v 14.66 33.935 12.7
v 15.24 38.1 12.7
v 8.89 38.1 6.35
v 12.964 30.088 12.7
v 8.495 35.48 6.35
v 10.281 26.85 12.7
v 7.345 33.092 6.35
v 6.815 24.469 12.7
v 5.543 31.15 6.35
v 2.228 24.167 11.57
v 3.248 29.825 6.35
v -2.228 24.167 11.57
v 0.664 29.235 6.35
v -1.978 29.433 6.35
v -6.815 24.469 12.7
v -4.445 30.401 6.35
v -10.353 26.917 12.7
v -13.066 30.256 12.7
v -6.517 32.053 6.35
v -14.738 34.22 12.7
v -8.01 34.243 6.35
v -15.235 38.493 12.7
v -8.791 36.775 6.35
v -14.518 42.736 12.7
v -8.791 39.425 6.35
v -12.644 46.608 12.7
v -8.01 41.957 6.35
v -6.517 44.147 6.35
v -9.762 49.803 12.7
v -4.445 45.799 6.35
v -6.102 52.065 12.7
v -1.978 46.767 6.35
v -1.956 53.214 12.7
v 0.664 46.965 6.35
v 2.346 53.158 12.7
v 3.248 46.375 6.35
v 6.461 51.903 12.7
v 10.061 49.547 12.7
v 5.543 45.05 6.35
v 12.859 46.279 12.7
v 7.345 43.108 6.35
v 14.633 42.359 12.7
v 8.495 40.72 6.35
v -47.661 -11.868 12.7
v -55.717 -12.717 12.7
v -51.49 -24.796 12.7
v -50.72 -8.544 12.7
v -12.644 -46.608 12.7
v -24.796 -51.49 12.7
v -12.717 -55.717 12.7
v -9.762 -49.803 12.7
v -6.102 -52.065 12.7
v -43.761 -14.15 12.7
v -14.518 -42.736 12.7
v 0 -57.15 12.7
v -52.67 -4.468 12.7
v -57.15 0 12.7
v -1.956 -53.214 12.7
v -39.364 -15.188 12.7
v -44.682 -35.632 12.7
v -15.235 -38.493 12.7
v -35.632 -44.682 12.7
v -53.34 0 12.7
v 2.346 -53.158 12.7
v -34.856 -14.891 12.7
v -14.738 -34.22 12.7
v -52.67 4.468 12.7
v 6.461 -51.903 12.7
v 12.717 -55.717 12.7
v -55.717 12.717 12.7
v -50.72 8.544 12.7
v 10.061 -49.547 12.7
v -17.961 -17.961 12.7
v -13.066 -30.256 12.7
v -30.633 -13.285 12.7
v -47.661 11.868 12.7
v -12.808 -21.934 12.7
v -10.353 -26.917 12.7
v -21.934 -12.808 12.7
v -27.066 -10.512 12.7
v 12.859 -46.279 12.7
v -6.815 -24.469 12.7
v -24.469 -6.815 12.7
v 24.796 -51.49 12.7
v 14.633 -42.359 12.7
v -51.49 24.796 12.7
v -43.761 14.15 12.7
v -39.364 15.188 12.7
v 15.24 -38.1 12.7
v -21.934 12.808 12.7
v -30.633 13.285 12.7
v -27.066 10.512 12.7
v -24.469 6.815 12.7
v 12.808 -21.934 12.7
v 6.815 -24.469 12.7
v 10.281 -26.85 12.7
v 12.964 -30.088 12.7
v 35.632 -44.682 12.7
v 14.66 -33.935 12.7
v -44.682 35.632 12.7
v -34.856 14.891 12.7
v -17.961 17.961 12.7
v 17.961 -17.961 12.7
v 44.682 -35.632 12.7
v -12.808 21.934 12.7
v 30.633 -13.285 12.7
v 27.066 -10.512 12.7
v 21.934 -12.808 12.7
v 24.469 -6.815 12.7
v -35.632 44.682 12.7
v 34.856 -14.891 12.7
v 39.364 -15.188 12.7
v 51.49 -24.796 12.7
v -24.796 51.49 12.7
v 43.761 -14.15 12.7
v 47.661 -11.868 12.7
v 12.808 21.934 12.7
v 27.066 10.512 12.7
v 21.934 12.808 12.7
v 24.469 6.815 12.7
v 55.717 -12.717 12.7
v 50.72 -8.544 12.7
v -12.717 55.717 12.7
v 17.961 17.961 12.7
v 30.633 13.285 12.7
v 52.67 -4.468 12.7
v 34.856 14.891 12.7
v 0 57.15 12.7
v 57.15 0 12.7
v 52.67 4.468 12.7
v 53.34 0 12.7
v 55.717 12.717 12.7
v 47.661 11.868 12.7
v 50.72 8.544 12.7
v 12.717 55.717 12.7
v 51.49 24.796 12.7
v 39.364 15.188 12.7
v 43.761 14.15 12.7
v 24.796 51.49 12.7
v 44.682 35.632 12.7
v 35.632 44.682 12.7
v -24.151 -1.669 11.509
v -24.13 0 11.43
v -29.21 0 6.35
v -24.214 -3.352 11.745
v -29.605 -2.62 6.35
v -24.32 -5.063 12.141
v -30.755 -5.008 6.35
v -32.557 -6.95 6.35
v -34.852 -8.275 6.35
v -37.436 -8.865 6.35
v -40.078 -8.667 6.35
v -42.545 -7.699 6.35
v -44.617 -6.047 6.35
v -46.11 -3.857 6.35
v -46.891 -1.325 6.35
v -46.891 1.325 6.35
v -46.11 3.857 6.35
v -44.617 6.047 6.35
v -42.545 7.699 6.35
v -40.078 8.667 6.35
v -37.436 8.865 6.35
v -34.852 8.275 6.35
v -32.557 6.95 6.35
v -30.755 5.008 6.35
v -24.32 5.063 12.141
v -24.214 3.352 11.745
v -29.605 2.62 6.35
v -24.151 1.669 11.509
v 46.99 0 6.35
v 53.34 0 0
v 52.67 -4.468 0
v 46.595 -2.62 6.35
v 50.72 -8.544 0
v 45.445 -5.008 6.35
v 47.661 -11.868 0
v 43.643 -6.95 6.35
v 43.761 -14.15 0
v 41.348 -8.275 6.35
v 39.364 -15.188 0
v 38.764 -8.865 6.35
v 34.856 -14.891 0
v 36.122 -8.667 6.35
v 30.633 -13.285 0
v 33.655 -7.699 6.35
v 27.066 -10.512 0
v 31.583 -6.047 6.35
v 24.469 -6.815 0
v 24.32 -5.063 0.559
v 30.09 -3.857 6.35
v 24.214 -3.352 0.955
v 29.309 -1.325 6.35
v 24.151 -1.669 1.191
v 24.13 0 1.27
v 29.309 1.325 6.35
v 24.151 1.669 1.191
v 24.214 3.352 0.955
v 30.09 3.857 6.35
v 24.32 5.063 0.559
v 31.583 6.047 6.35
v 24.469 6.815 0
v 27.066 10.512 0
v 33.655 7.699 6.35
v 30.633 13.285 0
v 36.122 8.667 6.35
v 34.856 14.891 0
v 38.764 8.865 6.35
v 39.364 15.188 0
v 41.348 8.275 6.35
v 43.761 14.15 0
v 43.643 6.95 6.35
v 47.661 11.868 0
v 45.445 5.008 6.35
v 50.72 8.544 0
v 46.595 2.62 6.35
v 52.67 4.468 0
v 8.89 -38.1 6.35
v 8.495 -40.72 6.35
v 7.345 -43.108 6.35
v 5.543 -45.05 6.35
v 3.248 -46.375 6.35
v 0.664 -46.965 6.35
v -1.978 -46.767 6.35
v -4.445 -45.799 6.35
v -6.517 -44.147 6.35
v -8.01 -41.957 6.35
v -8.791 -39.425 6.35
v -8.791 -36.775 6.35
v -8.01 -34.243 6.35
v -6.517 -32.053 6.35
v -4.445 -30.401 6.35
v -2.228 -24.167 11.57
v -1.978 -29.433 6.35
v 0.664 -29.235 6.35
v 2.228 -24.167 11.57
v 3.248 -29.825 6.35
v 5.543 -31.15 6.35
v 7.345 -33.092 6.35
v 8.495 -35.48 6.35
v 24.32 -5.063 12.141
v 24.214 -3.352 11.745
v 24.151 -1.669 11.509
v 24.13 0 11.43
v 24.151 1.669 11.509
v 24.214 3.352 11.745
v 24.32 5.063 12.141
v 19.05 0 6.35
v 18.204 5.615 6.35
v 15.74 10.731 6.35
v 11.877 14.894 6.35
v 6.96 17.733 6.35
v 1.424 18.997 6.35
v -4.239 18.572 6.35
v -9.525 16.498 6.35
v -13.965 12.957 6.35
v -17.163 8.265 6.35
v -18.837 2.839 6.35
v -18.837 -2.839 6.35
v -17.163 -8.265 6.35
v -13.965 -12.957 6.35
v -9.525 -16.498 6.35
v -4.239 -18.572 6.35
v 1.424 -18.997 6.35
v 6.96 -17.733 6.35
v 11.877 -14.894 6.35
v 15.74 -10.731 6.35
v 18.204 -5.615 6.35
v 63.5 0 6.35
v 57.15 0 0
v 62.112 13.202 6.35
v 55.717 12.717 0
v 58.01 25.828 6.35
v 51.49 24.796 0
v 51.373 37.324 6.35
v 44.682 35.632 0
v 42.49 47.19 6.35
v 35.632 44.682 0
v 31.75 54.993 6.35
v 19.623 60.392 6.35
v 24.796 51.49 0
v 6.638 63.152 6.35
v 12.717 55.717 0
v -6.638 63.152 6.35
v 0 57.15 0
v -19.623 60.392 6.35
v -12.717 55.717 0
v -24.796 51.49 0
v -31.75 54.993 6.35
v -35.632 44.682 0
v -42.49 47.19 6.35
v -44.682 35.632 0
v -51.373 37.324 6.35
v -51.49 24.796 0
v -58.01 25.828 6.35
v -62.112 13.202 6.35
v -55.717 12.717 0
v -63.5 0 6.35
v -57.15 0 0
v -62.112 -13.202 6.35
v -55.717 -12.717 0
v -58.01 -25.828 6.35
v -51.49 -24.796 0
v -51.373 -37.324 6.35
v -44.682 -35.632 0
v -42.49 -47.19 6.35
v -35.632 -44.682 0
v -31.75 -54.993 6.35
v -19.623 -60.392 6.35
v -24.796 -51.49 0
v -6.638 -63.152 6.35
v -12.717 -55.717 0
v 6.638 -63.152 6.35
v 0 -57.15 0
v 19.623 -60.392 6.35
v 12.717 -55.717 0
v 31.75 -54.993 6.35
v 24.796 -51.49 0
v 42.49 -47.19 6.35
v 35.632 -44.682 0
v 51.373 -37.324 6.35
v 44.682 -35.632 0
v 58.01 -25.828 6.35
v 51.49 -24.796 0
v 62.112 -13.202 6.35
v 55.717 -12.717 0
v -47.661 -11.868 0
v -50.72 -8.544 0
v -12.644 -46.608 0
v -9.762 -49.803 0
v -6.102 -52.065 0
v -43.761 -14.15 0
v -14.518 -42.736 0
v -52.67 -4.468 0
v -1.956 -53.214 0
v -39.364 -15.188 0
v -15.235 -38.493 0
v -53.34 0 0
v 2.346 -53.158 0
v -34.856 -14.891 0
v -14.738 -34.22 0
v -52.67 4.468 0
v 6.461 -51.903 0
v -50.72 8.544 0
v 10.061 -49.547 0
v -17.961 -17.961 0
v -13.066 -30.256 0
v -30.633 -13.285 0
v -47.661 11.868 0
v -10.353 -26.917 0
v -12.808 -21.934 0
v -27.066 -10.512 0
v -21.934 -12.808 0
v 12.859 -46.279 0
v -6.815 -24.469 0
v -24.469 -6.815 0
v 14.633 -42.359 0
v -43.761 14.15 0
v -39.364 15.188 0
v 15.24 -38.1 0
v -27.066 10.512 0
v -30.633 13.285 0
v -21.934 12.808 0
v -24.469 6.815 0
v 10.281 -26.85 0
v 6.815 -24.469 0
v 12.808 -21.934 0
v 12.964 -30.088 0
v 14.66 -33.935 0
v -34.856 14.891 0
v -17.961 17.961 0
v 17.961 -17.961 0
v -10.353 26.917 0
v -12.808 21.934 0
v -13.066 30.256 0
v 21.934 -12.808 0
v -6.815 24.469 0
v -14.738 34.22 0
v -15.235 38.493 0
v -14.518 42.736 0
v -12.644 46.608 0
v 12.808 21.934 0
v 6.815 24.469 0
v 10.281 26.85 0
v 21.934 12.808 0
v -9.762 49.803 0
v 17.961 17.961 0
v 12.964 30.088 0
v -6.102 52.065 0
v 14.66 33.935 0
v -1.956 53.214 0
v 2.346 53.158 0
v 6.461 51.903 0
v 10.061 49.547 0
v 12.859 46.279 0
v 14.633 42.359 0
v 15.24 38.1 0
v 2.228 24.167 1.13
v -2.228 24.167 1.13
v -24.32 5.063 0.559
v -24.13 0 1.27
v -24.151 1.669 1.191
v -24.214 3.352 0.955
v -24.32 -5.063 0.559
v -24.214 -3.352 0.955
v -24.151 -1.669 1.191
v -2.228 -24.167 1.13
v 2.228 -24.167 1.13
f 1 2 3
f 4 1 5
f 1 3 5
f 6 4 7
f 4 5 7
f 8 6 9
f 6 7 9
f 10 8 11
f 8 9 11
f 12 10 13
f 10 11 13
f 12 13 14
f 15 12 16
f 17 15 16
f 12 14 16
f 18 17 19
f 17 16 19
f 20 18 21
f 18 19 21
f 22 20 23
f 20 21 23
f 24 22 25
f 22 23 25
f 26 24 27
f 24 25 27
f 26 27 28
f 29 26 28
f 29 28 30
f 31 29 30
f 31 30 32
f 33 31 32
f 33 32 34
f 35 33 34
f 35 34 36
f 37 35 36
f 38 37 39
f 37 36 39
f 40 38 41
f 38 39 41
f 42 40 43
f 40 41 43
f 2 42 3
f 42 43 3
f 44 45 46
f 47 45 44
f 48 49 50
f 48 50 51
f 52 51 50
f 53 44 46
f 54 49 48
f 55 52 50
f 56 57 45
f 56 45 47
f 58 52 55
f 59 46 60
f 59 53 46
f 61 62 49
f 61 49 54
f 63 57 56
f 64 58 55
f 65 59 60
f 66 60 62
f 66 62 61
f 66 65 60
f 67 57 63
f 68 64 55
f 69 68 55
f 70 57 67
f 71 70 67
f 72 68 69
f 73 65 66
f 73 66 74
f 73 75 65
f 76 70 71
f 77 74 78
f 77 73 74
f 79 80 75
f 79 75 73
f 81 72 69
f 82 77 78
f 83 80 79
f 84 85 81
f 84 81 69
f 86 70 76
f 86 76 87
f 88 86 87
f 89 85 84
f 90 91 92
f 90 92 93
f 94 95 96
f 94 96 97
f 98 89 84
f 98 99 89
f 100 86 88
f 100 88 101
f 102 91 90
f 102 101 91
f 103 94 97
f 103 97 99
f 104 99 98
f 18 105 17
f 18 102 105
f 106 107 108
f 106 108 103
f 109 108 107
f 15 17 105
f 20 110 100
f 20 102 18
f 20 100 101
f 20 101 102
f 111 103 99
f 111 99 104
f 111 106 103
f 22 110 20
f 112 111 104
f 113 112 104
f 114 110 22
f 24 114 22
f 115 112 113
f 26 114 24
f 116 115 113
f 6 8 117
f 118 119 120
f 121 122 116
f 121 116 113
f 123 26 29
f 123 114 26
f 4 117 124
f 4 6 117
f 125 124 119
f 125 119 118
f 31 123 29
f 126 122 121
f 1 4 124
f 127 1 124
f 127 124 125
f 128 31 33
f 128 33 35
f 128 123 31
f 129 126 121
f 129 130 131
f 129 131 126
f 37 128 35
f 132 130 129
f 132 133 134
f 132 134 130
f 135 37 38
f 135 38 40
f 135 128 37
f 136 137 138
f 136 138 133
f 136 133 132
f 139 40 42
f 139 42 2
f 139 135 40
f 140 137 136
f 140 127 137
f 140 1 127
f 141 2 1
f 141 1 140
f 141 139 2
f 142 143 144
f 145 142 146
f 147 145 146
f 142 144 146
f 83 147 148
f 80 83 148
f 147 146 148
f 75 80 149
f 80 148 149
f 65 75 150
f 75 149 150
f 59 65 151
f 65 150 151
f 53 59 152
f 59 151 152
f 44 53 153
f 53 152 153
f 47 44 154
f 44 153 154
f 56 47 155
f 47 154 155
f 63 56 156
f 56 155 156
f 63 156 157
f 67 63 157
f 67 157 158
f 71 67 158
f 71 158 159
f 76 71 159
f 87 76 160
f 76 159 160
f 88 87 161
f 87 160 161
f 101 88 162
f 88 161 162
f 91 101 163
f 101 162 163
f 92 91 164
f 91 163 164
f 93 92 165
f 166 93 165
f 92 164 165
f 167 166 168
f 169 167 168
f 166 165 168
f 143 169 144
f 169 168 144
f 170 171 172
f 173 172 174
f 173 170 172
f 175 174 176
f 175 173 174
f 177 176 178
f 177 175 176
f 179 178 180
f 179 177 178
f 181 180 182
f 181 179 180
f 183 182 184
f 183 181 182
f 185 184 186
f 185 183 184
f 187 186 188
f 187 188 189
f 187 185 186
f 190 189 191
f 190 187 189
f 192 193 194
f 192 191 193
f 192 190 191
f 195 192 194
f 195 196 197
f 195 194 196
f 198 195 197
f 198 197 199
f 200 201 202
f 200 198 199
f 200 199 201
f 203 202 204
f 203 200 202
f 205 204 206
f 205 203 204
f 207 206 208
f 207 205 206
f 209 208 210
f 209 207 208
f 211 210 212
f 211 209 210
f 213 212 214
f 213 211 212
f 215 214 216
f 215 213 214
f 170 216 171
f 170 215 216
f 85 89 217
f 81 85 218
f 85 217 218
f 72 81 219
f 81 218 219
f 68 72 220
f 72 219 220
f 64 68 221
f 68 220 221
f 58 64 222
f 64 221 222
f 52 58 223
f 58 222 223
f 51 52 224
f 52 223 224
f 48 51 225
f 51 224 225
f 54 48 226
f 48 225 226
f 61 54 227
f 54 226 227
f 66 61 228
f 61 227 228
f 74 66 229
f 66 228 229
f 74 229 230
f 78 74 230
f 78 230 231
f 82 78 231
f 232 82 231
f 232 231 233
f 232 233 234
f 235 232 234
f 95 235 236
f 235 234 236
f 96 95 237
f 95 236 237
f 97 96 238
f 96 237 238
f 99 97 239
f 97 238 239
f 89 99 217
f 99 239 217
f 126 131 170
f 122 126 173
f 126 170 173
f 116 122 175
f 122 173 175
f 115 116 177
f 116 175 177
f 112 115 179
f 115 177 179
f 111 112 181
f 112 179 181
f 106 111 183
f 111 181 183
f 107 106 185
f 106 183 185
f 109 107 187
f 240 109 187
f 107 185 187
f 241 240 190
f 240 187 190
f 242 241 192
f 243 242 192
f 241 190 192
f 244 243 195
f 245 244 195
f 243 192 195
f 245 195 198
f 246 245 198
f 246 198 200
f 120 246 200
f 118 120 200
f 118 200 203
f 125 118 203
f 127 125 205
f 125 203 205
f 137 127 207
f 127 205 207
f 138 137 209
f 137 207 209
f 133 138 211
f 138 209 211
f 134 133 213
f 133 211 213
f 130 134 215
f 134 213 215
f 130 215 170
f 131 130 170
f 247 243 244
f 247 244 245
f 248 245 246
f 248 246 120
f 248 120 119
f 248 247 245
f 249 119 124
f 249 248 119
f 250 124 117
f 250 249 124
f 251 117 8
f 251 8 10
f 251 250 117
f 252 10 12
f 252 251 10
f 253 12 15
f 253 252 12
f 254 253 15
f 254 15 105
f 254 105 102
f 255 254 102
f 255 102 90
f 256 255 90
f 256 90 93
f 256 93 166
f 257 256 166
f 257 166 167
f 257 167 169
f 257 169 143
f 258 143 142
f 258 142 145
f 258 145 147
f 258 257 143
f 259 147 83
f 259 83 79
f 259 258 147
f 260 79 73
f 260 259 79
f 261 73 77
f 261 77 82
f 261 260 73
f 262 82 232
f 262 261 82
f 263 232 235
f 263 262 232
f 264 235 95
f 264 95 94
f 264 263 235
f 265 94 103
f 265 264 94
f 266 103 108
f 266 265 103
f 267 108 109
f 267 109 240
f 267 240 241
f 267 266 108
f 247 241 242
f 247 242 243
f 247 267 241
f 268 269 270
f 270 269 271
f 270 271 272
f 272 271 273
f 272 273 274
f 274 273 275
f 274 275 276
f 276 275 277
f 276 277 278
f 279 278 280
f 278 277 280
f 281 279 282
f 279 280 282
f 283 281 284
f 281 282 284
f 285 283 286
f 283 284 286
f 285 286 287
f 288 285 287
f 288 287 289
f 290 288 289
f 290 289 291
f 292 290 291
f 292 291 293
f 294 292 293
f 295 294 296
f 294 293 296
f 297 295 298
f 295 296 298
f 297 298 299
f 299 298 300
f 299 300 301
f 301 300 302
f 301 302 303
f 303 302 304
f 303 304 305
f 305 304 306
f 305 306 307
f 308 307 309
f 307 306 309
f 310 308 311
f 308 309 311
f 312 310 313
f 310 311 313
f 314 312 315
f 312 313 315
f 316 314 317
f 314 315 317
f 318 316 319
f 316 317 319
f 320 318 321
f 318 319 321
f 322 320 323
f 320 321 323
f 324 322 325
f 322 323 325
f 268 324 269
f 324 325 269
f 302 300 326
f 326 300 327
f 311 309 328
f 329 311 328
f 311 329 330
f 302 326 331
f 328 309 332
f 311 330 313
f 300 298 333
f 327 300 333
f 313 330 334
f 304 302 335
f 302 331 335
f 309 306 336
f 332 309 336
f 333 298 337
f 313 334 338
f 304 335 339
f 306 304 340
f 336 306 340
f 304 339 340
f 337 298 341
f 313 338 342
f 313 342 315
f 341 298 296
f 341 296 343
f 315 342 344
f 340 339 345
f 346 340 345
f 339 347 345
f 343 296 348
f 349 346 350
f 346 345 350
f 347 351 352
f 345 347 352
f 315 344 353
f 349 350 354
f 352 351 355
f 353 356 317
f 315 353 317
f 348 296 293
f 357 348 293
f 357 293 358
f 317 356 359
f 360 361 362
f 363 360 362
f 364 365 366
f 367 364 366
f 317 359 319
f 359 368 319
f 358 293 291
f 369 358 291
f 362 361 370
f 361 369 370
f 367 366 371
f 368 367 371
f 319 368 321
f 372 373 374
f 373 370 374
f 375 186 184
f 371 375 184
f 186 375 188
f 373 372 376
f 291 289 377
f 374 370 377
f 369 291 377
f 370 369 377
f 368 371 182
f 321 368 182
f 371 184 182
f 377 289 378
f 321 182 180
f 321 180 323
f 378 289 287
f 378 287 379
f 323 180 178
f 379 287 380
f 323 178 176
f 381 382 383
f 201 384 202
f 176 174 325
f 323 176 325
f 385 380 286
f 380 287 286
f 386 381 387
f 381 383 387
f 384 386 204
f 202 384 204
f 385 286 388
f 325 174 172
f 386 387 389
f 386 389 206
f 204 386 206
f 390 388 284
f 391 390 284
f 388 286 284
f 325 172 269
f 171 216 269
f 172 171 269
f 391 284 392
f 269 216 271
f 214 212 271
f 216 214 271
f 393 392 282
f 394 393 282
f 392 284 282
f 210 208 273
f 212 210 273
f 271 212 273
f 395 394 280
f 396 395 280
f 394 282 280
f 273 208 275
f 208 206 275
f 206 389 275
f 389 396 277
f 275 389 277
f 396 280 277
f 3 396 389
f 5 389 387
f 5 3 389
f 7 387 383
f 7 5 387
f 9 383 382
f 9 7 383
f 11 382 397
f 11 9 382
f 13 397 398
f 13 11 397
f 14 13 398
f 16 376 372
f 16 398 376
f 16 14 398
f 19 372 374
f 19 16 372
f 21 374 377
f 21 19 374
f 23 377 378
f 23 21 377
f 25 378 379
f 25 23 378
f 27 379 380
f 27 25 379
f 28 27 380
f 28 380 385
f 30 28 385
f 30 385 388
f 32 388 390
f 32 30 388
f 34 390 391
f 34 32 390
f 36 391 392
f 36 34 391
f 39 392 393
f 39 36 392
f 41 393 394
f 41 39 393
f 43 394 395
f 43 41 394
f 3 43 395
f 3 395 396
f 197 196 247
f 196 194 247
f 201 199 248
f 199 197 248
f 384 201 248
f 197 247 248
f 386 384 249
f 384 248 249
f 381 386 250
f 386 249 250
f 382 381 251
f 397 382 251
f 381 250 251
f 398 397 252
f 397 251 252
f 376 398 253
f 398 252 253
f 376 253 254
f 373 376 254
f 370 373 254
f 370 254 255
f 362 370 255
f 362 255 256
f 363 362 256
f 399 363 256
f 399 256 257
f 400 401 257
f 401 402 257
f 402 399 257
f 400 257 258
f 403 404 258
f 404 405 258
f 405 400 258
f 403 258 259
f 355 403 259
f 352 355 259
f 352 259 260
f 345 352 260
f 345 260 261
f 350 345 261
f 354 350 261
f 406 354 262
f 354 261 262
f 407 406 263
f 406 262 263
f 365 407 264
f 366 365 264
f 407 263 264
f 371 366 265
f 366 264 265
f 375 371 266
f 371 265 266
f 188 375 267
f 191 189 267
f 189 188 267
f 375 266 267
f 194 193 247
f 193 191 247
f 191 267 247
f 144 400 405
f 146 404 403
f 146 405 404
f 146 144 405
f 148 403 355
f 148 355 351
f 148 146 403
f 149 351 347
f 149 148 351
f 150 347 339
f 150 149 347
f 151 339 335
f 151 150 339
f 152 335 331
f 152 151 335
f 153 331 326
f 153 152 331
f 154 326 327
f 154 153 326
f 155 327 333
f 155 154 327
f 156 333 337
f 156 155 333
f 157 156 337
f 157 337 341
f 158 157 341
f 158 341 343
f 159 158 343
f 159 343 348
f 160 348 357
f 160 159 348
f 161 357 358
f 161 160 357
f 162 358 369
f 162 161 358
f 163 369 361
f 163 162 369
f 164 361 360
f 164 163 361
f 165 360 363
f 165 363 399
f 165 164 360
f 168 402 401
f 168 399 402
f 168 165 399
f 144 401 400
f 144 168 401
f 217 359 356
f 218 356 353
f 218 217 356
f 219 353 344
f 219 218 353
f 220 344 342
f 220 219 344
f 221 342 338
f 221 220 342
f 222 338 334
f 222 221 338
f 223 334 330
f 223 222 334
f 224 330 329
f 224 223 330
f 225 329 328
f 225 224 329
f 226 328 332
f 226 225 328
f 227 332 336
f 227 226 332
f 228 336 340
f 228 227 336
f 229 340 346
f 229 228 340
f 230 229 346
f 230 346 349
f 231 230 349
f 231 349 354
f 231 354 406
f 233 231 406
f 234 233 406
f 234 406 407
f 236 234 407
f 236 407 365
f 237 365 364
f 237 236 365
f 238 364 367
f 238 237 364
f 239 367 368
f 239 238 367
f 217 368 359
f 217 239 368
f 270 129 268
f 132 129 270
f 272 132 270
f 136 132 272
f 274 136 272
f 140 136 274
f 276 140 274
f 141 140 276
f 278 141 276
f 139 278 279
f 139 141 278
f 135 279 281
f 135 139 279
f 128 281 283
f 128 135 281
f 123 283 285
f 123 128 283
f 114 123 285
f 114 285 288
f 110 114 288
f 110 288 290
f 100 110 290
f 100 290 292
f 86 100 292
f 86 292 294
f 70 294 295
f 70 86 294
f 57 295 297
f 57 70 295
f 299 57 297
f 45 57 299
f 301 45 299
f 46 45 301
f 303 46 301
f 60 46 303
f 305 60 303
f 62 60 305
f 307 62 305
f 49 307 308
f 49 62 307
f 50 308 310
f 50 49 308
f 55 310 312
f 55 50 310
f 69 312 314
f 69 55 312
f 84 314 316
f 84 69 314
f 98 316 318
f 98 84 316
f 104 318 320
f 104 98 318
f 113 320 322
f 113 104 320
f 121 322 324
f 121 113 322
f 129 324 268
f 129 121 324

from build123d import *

# Parameters (mm, degrees)
F0_R     = 63.5
F0_R_2   = 19.05
F1_DEPTH = 12.7
F3_D     = 17.78


# Not quite as in the source:
# - a fillet or chamfer that OpenCascade refuses, or shapes differently, is made with other operations: its cross-section is extruded or revolved along the edge and cut away or added


with BuildPart() as f1:
    # F0 (on Top) → F1 (new body)
    with BuildSketch(Plane.XY):
        Circle(F0_R)
        Circle(F0_R_2, mode=Mode.SUBTRACT)
    extrude(amount=F1_DEPTH)

    # F3 (through all)
    with Locations(Plane(origin=(0, 0, 0), x_dir=(1, 0, 0), z_dir=(0, 0, -1))):
        with Locations((0, -38.1), (-38.1, 0), (0, 38.1), (38.1, 0)):
            Hole(F3_D / 2)

    # F4: chamfer of 6.35 on 12 edges, made by hand

    # F4_s1 → F4_t2 (revolve, cut)
    with BuildSketch(Plane.XZ):
        Polygon((25.4, 0), (19.05, 6.35), (19.05, 0), align=None)
    revolve(axis=Axis((0, 0, 0), (0, 0, 1)), mode=Mode.SUBTRACT)

    # F4_s3 → F4_t4 (revolve, cut)
    with BuildSketch(Plane.XZ):
        Polygon((25.4, 12.7), (19.05, 6.35), (19.05, 12.7), align=None)
    revolve(axis=Axis((0, 0, 12.7), (0, 0, 1)), mode=Mode.SUBTRACT)

    # F4_s5 → F4_t6 (revolve, cut)
    with BuildSketch(Plane.XZ):
        Polygon((63.5, 6.35), (57.15, 12.7), (63.5, 12.7), align=None)
    revolve(axis=Axis((0, 0, 12.7), (0, 0, 1)), mode=Mode.SUBTRACT)

    # F4_s7 → F4_t8 (revolve, cut)
    with BuildSketch(Plane.XZ):
        Polygon((63.5, 6.35), (57.15, 0), (63.5, 0), align=None)
    revolve(axis=Axis((0, 0, 0), (0, 0, 1)), mode=Mode.SUBTRACT)

    # F4_s9 → F4_t10 (revolve, cut)
    with BuildSketch(Plane.XZ.offset(38.1)):
        Polygon((15.24, 0), (8.89, 6.35), (8.89, 0), align=None)
    revolve(axis=Axis((0, -38.1, 0), (0, 0, -1)), mode=Mode.SUBTRACT)

    # F4_s11 → F4_t12 (revolve, cut)
    with BuildSketch(Plane.XZ):
        Polygon((-22.86, 0), (-29.21, 6.35), (-29.21, 0), align=None)
    revolve(axis=Axis((-38.1, 0, 0), (0, 0, -1)), mode=Mode.SUBTRACT)

    # F4_s13 → F4_t14 (revolve, cut)
    with BuildSketch(Plane.XZ):
        Polygon((53.34, 0), (46.99, 6.35), (46.99, 0), align=None)
    revolve(axis=Axis((38.1, 0, 0), (0, 0, -1)), mode=Mode.SUBTRACT)

    # F4_s15 → F4_t16 (revolve, cut)
    with BuildSketch(Plane.XZ.offset(-38.1)):
        Polygon((15.24, 0), (8.89, 6.35), (8.89, 0), align=None)
    revolve(axis=Axis((0, 38.1, 0), (0, 0, -1)), mode=Mode.SUBTRACT)

    # F4_s17 → F4_t18 (revolve, cut)
    with BuildSketch(Plane.XZ.offset(38.1)):
        Polygon((15.24, 12.7), (8.89, 6.35), (8.89, 12.7), align=None)
    revolve(axis=Axis((0, -38.1, 12.7), (0, 0, -1)), mode=Mode.SUBTRACT)

    # F4_s19 → F4_t20 (revolve, cut)
    with BuildSketch(Plane.XZ):
        Polygon((-22.86, 12.7), (-29.21, 6.35), (-29.21, 12.7), align=None)
    revolve(axis=Axis((-38.1, 0, 12.7), (0, 0, -1)), mode=Mode.SUBTRACT)

    # F4_s21 → F4_t22 (revolve, cut)
    with BuildSketch(Plane.XZ):
        Polygon((53.34, 12.7), (46.99, 6.35), (46.99, 12.7), align=None)
    revolve(axis=Axis((38.1, 0, 12.7), (0, 0, -1)), mode=Mode.SUBTRACT)

    # F4_s23 → F4_t24 (revolve, cut)
    with BuildSketch(Plane.XZ.offset(-38.1)):
        Polygon((15.24, 12.7), (8.89, 6.35), (8.89, 12.7), align=None)
    revolve(axis=Axis((0, 38.1, 12.7), (0, 0, -1)), mode=Mode.SUBTRACT)


solid = f1.part
